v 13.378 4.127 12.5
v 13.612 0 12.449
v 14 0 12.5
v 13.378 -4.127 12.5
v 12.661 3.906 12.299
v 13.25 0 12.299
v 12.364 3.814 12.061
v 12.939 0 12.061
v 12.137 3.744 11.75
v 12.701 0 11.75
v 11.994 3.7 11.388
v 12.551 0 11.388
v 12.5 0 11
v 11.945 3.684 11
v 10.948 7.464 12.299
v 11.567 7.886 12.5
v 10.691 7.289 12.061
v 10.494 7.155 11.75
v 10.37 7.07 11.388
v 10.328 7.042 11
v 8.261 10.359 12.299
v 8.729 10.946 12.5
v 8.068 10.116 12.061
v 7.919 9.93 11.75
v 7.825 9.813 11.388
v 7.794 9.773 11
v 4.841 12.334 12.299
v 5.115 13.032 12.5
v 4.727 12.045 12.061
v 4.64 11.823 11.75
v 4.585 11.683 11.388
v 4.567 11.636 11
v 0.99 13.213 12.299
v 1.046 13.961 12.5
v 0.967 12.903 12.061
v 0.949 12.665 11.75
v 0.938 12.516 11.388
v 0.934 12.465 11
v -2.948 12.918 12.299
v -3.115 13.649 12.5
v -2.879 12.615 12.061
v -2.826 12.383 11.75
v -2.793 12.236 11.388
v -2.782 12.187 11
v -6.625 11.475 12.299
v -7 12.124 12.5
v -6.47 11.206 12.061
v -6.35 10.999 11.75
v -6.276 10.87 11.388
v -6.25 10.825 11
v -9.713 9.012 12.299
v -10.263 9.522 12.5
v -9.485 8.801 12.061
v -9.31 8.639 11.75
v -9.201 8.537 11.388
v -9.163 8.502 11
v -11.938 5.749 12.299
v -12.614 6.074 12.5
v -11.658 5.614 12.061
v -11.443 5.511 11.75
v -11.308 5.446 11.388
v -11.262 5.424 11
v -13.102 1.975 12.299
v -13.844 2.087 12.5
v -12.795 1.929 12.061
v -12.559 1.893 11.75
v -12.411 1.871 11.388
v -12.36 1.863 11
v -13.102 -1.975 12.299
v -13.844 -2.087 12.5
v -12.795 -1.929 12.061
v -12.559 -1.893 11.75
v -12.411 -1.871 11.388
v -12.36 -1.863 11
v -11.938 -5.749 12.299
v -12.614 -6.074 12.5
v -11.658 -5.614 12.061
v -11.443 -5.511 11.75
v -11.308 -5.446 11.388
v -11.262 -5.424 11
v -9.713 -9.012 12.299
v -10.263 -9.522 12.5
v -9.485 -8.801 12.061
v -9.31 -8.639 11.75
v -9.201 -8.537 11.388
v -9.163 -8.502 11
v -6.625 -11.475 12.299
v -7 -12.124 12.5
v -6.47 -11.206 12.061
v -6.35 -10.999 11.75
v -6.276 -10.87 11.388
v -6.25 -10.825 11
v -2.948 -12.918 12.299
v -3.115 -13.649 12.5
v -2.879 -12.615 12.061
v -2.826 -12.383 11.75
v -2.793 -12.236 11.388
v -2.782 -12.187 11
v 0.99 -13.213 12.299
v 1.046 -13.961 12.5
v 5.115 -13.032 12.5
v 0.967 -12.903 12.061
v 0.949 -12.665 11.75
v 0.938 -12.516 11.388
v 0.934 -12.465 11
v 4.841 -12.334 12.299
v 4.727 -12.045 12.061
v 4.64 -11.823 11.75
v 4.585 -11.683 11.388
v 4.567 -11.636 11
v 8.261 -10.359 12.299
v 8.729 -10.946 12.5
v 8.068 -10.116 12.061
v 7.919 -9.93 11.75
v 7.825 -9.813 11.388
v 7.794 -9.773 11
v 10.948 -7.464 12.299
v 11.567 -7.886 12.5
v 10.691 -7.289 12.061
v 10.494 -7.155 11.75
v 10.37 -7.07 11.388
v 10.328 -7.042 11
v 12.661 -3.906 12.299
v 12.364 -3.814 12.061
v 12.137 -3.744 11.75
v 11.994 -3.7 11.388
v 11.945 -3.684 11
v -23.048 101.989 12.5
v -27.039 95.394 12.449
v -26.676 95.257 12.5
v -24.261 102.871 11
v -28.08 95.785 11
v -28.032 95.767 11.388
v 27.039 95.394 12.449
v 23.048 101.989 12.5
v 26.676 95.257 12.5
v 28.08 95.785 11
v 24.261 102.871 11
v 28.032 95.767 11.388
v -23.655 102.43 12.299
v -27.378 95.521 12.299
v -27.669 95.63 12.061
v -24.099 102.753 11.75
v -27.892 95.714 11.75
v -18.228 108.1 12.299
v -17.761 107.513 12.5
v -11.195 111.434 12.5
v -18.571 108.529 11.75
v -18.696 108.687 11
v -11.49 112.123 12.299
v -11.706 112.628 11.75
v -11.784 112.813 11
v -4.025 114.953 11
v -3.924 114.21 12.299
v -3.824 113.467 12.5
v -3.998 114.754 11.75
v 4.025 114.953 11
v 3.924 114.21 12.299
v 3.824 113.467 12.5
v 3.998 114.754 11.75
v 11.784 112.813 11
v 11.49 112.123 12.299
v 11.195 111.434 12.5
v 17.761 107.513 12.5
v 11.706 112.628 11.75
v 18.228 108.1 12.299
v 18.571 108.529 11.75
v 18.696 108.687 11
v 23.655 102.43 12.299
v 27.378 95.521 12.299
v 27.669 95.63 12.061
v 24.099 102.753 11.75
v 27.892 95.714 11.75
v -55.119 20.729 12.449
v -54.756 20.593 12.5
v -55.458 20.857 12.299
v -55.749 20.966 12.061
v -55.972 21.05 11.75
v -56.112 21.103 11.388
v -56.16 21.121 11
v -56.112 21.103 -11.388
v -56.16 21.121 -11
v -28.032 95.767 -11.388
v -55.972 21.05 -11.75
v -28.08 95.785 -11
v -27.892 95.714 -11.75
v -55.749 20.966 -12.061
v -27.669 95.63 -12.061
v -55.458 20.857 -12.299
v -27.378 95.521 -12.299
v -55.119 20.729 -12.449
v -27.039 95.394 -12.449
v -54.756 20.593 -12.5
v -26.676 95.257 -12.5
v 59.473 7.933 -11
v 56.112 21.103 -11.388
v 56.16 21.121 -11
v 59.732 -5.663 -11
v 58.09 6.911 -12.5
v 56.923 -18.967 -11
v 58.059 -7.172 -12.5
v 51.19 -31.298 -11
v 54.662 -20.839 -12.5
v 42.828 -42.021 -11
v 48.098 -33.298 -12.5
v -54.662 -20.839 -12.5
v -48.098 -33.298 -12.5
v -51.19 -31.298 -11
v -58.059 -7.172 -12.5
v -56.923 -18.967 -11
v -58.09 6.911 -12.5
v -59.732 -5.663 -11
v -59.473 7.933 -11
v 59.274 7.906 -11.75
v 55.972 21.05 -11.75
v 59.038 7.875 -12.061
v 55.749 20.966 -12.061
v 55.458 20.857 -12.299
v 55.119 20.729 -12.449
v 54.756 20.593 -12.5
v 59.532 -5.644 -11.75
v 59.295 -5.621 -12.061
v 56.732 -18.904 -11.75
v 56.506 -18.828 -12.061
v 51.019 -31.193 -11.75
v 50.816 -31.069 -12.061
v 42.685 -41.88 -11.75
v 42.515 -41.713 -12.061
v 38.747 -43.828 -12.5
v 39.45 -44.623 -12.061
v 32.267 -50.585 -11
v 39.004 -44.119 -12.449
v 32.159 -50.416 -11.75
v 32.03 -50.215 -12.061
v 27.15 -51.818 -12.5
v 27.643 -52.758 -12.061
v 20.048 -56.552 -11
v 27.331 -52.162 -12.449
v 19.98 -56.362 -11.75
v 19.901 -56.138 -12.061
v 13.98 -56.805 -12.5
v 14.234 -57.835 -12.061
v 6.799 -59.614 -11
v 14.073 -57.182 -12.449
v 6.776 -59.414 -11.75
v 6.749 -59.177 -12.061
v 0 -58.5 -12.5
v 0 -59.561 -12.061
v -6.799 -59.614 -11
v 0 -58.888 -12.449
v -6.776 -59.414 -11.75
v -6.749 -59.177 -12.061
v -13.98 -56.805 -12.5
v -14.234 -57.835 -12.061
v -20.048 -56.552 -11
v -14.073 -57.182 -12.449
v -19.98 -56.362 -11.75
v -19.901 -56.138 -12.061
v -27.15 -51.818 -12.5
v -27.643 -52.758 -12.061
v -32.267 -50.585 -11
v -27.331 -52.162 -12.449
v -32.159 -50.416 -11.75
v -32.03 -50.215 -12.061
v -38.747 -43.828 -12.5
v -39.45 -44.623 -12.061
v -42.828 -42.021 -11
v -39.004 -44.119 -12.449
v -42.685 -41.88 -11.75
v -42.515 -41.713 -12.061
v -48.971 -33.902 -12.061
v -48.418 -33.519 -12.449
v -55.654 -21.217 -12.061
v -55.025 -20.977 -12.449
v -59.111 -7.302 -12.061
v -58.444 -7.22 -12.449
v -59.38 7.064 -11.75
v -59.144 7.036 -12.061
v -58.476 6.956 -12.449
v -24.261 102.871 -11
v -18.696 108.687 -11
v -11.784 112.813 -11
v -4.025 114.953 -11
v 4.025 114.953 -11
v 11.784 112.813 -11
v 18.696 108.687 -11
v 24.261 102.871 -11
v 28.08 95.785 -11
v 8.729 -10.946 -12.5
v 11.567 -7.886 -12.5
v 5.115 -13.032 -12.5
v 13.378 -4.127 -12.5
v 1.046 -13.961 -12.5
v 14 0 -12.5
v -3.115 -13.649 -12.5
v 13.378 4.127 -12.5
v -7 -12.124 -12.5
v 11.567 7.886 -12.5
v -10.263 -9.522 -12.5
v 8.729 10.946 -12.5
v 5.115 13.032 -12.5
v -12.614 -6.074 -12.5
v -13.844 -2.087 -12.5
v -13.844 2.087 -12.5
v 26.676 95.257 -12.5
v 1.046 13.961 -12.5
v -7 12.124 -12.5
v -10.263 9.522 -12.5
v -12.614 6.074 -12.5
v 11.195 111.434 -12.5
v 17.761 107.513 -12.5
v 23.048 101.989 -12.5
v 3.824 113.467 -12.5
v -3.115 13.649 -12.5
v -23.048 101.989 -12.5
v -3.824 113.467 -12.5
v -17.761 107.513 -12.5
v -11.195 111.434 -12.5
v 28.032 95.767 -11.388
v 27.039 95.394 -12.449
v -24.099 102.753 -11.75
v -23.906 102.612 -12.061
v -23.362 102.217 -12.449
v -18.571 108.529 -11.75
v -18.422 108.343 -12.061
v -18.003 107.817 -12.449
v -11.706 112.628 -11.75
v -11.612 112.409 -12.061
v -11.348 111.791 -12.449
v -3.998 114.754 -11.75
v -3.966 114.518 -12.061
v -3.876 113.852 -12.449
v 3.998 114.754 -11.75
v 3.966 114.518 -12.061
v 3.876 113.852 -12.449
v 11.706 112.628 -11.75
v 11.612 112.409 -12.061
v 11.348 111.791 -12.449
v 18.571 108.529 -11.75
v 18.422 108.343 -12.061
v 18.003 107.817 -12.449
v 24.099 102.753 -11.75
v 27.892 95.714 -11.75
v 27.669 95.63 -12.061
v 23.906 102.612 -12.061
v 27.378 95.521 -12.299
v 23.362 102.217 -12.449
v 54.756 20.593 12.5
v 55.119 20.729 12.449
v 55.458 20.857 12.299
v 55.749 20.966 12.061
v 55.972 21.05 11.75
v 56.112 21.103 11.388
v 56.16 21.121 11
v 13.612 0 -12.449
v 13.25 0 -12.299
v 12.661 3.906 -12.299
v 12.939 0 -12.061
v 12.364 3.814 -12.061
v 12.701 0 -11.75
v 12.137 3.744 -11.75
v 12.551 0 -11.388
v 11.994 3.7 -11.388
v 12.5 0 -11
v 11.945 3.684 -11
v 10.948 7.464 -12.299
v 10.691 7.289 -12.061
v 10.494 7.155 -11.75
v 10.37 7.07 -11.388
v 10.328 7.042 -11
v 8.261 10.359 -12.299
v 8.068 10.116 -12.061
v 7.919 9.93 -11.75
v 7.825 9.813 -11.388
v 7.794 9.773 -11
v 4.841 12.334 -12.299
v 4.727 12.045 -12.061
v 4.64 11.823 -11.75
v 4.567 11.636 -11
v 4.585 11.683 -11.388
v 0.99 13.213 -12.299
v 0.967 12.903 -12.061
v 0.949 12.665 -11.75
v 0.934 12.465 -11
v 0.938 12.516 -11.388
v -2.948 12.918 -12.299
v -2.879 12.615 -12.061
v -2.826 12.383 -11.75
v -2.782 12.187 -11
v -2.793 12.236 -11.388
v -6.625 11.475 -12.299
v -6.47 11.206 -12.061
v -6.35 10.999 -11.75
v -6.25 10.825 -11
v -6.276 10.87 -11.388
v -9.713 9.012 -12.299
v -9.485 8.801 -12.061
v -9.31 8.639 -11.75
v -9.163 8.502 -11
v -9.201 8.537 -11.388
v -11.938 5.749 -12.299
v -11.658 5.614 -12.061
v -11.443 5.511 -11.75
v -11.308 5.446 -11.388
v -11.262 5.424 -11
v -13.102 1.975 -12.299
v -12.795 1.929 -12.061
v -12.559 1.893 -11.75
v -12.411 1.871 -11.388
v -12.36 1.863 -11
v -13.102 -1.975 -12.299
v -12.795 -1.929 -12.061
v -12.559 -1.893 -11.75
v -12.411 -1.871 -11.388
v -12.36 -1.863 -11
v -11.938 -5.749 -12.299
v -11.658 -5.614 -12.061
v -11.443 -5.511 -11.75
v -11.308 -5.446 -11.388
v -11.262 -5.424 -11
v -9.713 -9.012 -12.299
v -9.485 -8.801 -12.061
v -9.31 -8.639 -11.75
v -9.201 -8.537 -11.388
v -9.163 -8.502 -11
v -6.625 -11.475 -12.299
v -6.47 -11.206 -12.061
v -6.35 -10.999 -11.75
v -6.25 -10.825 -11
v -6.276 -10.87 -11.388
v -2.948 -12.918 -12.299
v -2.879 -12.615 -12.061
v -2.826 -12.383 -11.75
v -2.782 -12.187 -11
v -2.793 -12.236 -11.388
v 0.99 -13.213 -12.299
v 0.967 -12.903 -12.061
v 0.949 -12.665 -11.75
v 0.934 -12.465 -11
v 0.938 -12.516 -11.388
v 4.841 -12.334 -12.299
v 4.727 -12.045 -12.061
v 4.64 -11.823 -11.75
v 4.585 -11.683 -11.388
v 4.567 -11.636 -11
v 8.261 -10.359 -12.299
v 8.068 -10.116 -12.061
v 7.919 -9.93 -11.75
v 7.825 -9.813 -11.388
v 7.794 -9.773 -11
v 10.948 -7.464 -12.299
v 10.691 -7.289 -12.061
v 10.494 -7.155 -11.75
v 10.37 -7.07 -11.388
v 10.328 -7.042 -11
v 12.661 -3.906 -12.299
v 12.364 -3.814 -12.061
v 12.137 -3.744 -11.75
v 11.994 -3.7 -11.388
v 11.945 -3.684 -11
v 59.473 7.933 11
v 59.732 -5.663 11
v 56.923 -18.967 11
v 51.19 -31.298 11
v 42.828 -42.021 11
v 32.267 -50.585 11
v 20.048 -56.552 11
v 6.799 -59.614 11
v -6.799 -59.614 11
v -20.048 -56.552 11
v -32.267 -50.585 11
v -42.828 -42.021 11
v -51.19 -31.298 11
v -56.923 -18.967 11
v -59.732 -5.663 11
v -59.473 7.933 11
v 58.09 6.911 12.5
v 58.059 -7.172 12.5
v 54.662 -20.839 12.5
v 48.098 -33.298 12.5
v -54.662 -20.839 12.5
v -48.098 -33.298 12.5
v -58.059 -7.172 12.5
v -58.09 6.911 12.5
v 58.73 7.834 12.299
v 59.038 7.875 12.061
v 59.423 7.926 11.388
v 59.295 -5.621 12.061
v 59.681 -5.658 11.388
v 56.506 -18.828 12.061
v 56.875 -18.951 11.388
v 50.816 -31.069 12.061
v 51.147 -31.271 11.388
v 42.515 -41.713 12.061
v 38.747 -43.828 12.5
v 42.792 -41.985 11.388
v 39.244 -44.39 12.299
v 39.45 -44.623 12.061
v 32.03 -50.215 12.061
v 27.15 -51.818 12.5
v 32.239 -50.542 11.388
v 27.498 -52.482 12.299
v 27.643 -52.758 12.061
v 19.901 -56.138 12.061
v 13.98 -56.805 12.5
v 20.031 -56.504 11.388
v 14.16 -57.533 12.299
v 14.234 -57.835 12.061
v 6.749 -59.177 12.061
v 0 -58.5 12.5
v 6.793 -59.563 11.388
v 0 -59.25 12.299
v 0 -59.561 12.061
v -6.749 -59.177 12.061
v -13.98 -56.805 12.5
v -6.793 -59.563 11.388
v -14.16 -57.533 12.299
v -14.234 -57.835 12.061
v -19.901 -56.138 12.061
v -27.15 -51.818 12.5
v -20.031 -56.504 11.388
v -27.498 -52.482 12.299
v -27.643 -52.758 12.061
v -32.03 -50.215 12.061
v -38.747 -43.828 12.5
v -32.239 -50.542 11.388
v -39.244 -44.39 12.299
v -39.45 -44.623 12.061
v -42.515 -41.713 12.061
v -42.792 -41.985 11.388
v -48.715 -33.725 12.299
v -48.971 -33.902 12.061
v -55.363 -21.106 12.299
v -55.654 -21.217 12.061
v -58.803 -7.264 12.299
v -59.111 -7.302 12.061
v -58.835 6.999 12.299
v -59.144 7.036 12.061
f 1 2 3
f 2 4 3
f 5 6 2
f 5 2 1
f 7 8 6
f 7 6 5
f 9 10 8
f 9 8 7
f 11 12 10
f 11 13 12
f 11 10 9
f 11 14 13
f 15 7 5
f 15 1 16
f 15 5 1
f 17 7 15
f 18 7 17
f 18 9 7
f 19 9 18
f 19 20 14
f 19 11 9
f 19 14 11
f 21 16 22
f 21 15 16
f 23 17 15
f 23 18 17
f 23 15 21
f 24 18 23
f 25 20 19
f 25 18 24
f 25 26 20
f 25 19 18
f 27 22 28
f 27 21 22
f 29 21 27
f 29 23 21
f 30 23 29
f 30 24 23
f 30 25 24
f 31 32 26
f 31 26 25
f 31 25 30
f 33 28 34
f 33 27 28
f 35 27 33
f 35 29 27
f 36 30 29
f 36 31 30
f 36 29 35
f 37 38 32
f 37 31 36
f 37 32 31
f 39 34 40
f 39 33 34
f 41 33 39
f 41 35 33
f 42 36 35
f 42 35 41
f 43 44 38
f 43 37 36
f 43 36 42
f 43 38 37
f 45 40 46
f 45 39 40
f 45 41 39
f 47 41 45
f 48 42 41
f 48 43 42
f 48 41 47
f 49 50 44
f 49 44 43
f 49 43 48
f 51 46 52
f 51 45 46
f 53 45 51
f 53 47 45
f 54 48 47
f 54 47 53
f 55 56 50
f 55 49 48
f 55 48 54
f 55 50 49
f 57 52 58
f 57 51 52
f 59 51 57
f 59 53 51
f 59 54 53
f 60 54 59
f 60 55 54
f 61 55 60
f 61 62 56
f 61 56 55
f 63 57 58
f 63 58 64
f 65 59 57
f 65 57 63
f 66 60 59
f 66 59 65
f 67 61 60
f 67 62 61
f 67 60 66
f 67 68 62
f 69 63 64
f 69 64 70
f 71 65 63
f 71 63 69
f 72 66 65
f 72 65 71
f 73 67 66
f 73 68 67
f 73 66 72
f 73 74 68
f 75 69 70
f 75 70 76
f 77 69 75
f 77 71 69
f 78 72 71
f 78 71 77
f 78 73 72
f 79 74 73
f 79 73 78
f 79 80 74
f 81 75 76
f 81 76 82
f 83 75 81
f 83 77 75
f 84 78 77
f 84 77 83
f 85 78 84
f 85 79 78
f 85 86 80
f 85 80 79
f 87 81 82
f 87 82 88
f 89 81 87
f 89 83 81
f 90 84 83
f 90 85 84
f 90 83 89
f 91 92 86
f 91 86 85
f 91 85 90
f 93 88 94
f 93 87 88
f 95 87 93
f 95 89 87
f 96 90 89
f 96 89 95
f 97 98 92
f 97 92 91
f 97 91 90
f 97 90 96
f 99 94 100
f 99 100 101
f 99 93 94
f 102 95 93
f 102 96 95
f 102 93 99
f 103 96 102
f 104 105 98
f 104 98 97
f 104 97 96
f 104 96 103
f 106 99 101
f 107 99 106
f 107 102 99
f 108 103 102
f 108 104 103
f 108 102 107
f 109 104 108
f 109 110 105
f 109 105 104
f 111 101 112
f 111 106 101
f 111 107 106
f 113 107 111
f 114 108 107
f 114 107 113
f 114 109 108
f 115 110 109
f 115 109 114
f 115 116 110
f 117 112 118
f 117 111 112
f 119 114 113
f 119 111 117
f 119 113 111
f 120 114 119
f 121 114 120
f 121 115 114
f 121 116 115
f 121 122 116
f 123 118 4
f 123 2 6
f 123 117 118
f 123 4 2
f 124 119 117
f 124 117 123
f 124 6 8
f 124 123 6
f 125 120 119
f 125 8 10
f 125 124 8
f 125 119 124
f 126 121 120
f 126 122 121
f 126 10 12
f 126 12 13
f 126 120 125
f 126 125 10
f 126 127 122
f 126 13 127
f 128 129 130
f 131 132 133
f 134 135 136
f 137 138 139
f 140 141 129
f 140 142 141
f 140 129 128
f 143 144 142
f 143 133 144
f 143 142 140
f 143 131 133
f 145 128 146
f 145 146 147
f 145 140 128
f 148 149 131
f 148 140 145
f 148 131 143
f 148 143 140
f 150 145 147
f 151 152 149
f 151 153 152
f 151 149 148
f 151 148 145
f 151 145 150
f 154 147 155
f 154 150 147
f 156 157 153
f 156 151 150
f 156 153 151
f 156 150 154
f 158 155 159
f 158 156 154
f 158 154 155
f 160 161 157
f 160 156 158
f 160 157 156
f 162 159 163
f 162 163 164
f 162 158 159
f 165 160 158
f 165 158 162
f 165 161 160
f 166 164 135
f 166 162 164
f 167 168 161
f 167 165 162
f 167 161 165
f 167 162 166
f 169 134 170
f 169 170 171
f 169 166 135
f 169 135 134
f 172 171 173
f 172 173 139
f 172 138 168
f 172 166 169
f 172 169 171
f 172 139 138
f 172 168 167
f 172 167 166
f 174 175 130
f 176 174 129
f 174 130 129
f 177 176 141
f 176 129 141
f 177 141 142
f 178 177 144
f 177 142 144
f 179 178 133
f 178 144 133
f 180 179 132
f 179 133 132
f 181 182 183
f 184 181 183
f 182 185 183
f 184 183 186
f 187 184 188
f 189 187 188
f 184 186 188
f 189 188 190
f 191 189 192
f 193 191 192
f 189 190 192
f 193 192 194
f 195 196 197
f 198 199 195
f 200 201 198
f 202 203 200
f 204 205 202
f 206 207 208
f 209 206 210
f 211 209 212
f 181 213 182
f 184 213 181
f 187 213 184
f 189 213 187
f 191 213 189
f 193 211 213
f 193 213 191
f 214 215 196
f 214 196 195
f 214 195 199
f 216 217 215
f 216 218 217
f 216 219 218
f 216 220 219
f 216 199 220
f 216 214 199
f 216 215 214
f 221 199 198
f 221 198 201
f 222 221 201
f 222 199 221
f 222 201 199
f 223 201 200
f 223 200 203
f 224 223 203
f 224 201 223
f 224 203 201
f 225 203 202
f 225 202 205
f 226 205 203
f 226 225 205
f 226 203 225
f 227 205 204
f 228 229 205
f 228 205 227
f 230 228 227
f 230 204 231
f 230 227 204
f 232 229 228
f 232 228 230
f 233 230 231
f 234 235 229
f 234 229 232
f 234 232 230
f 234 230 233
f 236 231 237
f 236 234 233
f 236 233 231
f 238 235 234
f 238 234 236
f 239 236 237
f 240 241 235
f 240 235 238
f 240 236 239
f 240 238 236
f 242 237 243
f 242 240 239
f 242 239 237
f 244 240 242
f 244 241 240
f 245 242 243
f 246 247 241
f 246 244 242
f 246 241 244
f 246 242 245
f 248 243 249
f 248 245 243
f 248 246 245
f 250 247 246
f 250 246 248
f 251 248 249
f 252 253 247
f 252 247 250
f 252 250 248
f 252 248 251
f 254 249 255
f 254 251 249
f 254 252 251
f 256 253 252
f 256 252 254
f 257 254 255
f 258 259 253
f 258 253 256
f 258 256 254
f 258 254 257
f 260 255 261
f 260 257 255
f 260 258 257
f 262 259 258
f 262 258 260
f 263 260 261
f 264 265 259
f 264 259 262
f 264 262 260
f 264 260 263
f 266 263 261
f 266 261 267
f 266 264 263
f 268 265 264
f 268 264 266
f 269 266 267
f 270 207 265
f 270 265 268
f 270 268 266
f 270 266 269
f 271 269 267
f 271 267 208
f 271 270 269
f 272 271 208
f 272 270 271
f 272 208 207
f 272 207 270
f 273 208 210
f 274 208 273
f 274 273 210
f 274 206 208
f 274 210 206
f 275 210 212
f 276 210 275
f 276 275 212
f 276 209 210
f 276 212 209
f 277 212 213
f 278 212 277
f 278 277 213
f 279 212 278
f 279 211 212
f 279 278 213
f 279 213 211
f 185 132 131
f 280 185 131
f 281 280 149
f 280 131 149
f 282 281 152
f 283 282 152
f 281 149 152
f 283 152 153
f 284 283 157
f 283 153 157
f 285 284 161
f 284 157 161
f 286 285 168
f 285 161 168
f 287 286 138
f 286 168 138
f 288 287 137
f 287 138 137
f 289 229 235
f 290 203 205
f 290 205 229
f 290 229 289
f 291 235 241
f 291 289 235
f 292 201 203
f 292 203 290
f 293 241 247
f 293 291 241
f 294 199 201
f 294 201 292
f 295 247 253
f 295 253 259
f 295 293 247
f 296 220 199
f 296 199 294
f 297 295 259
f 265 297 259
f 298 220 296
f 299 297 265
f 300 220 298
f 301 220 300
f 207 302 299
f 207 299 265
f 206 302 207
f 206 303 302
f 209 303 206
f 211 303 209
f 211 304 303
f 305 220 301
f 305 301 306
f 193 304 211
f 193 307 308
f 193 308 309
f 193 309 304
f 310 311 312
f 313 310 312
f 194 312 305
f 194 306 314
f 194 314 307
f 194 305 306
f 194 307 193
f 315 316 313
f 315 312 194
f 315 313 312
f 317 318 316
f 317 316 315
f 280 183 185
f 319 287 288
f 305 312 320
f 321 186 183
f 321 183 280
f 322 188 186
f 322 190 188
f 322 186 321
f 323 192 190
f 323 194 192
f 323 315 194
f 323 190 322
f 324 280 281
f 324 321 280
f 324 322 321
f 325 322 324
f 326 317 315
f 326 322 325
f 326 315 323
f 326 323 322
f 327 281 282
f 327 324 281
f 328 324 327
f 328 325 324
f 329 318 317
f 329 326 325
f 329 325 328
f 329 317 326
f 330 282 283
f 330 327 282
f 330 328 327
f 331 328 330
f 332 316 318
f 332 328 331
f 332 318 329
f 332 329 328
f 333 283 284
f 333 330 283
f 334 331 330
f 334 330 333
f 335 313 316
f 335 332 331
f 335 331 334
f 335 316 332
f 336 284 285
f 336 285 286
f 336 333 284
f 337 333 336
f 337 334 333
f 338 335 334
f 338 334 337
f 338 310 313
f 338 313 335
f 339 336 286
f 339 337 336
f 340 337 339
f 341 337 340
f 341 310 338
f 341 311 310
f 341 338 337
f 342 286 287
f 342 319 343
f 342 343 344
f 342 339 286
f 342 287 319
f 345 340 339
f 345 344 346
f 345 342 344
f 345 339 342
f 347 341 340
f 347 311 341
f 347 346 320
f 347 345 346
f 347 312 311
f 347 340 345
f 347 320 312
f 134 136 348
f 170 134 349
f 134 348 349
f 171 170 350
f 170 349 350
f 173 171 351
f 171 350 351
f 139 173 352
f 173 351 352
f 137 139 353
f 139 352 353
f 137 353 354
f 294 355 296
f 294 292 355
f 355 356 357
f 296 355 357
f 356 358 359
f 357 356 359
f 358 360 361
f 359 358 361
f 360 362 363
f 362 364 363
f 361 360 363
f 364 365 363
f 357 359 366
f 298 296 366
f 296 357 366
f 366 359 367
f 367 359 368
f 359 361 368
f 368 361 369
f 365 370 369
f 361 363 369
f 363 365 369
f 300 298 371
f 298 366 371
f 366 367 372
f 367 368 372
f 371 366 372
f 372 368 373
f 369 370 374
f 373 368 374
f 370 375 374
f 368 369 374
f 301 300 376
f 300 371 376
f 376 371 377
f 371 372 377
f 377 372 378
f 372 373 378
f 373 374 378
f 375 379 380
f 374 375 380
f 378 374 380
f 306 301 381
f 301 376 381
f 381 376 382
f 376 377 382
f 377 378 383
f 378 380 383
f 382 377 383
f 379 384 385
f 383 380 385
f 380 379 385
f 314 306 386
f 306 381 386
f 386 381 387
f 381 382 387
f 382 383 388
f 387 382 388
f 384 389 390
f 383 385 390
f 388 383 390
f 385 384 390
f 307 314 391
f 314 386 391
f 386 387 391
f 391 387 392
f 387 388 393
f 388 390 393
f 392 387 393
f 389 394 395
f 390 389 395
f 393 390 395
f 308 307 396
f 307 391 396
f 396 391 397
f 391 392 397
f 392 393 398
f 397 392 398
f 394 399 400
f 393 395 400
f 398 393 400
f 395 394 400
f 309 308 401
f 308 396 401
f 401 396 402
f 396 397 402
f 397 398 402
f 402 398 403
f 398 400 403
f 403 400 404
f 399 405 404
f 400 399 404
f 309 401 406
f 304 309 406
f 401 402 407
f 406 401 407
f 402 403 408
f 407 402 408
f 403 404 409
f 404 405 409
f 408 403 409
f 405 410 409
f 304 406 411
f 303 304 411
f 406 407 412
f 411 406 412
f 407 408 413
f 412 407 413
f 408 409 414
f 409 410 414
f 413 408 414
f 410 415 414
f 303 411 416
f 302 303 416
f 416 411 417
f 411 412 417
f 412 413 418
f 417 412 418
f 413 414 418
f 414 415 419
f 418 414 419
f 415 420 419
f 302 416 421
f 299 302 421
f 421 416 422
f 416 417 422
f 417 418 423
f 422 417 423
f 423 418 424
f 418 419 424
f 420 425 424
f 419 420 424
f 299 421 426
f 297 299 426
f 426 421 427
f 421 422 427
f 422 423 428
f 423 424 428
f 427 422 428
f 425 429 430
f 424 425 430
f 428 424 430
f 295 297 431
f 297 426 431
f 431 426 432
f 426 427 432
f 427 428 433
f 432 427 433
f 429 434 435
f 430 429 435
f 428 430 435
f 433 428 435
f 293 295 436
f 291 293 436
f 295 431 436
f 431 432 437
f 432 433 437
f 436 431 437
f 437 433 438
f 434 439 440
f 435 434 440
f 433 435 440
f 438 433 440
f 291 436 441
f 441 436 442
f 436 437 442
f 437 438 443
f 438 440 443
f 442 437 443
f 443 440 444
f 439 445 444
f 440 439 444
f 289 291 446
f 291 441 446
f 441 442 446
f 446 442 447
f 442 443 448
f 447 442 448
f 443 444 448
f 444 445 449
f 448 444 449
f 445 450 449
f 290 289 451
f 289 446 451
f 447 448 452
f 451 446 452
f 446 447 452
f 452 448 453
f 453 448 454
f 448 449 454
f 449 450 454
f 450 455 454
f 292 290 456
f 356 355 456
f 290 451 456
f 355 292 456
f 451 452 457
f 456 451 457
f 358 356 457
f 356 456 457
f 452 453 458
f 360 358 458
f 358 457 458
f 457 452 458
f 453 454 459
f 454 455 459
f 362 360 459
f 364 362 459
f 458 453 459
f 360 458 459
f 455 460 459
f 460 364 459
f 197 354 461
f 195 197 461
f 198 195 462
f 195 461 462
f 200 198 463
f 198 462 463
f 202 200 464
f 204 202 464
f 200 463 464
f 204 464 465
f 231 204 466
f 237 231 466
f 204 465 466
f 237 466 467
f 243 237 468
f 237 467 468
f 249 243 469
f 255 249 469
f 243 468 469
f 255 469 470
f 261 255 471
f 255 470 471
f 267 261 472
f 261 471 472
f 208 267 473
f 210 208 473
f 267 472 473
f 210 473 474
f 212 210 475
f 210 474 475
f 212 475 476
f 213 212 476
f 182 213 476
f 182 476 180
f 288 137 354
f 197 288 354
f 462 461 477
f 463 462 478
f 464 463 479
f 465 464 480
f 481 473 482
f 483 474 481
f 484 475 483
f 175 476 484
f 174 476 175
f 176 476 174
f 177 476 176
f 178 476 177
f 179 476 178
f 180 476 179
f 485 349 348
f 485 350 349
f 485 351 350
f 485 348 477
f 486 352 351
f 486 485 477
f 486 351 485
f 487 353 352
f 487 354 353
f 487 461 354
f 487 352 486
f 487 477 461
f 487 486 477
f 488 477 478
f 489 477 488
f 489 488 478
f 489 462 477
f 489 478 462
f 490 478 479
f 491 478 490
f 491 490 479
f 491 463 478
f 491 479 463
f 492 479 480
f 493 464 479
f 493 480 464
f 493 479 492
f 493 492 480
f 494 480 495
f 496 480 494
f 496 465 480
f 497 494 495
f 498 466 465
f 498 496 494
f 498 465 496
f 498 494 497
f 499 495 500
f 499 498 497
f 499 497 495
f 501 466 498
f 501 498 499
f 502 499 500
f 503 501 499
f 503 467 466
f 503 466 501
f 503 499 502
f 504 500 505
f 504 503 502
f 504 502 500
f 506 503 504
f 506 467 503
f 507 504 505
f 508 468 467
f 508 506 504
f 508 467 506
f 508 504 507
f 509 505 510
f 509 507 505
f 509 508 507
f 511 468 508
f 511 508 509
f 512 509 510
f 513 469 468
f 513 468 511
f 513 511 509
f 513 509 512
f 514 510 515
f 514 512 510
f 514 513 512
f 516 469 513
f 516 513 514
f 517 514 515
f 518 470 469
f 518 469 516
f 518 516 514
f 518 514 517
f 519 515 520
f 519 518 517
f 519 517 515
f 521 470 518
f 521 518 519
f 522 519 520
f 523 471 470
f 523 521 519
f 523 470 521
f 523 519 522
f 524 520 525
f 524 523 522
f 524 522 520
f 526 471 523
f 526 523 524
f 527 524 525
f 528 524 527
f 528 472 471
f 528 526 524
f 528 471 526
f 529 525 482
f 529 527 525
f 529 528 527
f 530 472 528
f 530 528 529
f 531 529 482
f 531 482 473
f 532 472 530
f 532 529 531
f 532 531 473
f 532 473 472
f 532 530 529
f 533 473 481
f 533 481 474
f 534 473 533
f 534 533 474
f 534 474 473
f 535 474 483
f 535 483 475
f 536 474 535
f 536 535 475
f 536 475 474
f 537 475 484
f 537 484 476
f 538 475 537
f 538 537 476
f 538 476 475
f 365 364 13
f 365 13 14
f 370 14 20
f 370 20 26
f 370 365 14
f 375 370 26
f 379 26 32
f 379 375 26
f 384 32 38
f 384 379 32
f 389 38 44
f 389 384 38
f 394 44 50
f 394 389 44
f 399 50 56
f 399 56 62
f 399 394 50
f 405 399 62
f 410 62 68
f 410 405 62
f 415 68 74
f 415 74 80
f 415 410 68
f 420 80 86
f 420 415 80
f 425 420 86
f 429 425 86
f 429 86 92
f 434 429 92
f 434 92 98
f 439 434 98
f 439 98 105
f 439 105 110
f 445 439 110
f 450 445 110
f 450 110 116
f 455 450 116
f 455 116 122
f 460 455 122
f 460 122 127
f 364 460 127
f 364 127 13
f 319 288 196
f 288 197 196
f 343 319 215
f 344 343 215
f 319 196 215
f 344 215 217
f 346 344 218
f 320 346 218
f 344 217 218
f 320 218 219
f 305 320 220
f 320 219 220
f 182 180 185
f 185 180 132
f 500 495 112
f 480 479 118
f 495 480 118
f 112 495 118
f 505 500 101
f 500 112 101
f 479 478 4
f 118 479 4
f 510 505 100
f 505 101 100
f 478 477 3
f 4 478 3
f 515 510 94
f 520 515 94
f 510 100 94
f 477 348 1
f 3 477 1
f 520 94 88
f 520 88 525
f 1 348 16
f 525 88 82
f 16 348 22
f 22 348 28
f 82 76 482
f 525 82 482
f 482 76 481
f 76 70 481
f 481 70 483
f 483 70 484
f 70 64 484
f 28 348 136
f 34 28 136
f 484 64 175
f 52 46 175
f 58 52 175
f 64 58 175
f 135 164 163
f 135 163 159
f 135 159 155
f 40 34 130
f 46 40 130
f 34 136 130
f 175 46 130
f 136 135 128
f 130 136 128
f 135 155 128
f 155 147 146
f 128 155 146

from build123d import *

# Parameters (mm, degrees)
SKETCH1_R           = 12.5
BOSS_EXTRUDE1_DEPTH = 12.5
FILLET1_R           = 1.5
FILLET2_R           = 1.5


with BuildPart() as part:
    # Sketch1 → Boss-Extrude1 (new, symmetric)
    with BuildSketch(Plane.XY):
        with BuildLine():
            Line((-56.159743046, 21.120683252), (-28.079871523, 95.784857261))
            ThreePointArc((-28.079871523, 95.784857261), (0, 115.224515635), (28.079871523, 95.784857261))
            Line((28.079871523, 95.784857261), (56.159743046, 21.120683252))
            ThreePointArc((56.159743046, 21.120683252), (0, -60), (-56.159743046, 21.120683252))
        make_face()
        Circle(SKETCH1_R, mode=Mode.SUBTRACT)
    extrude(amount=BOSS_EXTRUDE1_DEPTH, both=True)

    # Fillet1
    fillet1_edges = [part.edges().sort_by_distance(p)[0] for p in [
        (0, 115.224515635, 12.5),
        (-42.119807284, 58.452770256, 12.5),
        (0, -60, 12.5),
        (-42.119807284, 58.452770256, -12.5),
        (0, 115.224515635, -12.5),
        (42.119807284, 58.452770256, -12.5),
        (0, -60, -12.5),
        (42.119807284, 58.452770256, 12.5),
    ]]
    fillet(fillet1_edges, radius=FILLET1_R)

    # Fillet2
    fillet2_edges = [part.edges().sort_by_distance(p)[0] for p in [
        (-12.5, 0, -12.5),
        (-12.5, 0, 12.5),
    ]]
    fillet(fillet2_edges, radius=FILLET2_R)


solid = part.part
